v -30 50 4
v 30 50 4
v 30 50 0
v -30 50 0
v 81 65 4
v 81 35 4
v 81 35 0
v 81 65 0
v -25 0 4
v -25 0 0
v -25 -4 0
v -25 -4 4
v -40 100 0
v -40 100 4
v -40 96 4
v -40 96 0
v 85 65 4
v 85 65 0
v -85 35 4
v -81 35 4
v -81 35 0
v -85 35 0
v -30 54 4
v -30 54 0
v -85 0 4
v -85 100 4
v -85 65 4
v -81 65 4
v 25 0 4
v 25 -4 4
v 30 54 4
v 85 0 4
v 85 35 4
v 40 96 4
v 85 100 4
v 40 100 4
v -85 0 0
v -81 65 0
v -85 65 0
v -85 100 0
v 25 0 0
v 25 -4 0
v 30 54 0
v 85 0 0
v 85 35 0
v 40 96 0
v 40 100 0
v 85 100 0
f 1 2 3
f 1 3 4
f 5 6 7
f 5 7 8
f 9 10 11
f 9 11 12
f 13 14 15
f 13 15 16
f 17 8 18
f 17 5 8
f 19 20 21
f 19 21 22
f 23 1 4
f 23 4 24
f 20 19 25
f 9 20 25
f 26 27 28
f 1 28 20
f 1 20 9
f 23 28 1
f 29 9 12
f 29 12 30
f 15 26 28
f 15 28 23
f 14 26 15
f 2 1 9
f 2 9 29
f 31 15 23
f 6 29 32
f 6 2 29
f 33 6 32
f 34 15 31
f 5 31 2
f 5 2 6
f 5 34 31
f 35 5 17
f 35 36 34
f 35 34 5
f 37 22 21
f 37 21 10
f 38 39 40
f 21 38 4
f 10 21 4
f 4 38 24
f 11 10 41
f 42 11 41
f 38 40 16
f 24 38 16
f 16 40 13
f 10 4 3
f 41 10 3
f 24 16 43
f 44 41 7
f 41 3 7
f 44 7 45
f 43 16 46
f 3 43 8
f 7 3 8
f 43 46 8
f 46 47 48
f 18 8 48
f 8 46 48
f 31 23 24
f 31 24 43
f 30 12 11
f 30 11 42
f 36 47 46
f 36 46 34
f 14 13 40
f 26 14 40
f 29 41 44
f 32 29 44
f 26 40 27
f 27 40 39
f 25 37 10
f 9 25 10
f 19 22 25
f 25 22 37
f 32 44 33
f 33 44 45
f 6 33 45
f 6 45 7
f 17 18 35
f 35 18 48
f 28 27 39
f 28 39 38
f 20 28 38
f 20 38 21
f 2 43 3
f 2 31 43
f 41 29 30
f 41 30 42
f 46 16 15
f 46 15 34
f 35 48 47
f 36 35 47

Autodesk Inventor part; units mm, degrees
ref_plane "YZ Plane" through (0, 0, 0) normal (1, 0, 0) x (0, 1, 0)
ref_plane "XZ Plane" through (0, 0, 0) normal (0, 1, 0) x (-1, 0, 0)
ref_plane "XY Plane" through (0, 0, 0) normal (0, 0, 1) x (1, 0, 0)
sketch "Sketch1" plane through (0, 0, 0) normal (0, 0, 1) x (1, 0, 0)
  line L0 (-85, 0) -> (85, 0)
  line L1 (85, 0) -> (85, 100)
  line L2 (85, 100) -> (-85, 100)
  line L3 (-85, 100) -> (-85, 0)
  point P0 (0, 0)
  point P1 (0, 0)
  dimension "d0" = 170
  dimension "d1" = 100
extrude "Extrusion1" add sketch "Sketch1" along normal blind 4
sketch "Sketch2" plane through (-85, 0, 0) normal (0, -1, 0) x (1, 0, 0)
  line L0 (170, 4) -> (0, 4) projected
  line L1 (170, 0) -> (0, 0) projected
  line L2 (60, 4) -> (110, 4)
  line L3 (110, 4) -> (110, 0)
  line L4 (110, 0) -> (60, 0)
  line L5 (60, 0) -> (60, 4)
  point P0 (85, 0)
  point P1 (85, 0)
  dimension "d4" = 25
  dimension "d5" = 50
extrude "Extrusion2" add sketch "Sketch2" along normal blind 4
sketch "Sketch4" plane through (0, 0, 4) normal (0, 0, 1) x (1, 0, 0)
  line L0 (85, 0) -> (85, 100) projected
  line L1 (85, 35) -> (81, 35)
  line L2 (81, 35) -> (81, 65)
  line L3 (81, 65) -> (85, 65)
  line L4 (85, 65) -> (85, 35)
  line L5 (85, 100) -> (-85, 100) projected
  line L6 (25, 0) -> (85, 0) projected
  point P0 (0, 0)
  dimension "d12" = 4
  dimension "d13" = 35
  dimension "d14" = 35
extrude "Extrusion4" cut sketch "Sketch4" against normal blind 10
mirror "Mirror2" about plane through (0, 0, 0) normal (1, 0, 0) of "Extrusion4"
sketch "Sketch5" plane through (-85, 100, 0) normal (0, 1, 0) x (1, 0, 0)
  line L0 (170, -4) -> (0, -4) projected
  line L1 (45, 0) -> (125, 0)
  line L2 (125, 0) -> (125, -4)
  line L3 (125, -4) -> (45, -4)
  line L4 (45, -4) -> (45, 0)
  line L5 (170, 0) -> (0, 0) projected
  point P0 (85, 0)
  point P1 (85, 0)
  point P2 (45, -4)
  dimension "d17" = 80
  dimension "d18" = 40
extrude "Extrusion5" cut sketch "Sketch5" against normal blind 4
sketch "Sketch6" plane through (0, 0, 4) normal (0, 0, 1) x (1, 0, 0)
  line L0 (-30, 54) -> (30, 54)
  line L1 (30, 54) -> (30, 50)
  line L2 (30, 50) -> (-30, 50)
  line L3 (-30, 50) -> (-30, 54)
  point P0 (0, 0)
  point P1 (0, 54)
  dimension "d21" = 60
  dimension "d22" = 4
  dimension "d23" = 50
extrude "Extrusion6" cut sketch "Sketch6" against normal blind 10
properties part number "Tapa Tracera"
